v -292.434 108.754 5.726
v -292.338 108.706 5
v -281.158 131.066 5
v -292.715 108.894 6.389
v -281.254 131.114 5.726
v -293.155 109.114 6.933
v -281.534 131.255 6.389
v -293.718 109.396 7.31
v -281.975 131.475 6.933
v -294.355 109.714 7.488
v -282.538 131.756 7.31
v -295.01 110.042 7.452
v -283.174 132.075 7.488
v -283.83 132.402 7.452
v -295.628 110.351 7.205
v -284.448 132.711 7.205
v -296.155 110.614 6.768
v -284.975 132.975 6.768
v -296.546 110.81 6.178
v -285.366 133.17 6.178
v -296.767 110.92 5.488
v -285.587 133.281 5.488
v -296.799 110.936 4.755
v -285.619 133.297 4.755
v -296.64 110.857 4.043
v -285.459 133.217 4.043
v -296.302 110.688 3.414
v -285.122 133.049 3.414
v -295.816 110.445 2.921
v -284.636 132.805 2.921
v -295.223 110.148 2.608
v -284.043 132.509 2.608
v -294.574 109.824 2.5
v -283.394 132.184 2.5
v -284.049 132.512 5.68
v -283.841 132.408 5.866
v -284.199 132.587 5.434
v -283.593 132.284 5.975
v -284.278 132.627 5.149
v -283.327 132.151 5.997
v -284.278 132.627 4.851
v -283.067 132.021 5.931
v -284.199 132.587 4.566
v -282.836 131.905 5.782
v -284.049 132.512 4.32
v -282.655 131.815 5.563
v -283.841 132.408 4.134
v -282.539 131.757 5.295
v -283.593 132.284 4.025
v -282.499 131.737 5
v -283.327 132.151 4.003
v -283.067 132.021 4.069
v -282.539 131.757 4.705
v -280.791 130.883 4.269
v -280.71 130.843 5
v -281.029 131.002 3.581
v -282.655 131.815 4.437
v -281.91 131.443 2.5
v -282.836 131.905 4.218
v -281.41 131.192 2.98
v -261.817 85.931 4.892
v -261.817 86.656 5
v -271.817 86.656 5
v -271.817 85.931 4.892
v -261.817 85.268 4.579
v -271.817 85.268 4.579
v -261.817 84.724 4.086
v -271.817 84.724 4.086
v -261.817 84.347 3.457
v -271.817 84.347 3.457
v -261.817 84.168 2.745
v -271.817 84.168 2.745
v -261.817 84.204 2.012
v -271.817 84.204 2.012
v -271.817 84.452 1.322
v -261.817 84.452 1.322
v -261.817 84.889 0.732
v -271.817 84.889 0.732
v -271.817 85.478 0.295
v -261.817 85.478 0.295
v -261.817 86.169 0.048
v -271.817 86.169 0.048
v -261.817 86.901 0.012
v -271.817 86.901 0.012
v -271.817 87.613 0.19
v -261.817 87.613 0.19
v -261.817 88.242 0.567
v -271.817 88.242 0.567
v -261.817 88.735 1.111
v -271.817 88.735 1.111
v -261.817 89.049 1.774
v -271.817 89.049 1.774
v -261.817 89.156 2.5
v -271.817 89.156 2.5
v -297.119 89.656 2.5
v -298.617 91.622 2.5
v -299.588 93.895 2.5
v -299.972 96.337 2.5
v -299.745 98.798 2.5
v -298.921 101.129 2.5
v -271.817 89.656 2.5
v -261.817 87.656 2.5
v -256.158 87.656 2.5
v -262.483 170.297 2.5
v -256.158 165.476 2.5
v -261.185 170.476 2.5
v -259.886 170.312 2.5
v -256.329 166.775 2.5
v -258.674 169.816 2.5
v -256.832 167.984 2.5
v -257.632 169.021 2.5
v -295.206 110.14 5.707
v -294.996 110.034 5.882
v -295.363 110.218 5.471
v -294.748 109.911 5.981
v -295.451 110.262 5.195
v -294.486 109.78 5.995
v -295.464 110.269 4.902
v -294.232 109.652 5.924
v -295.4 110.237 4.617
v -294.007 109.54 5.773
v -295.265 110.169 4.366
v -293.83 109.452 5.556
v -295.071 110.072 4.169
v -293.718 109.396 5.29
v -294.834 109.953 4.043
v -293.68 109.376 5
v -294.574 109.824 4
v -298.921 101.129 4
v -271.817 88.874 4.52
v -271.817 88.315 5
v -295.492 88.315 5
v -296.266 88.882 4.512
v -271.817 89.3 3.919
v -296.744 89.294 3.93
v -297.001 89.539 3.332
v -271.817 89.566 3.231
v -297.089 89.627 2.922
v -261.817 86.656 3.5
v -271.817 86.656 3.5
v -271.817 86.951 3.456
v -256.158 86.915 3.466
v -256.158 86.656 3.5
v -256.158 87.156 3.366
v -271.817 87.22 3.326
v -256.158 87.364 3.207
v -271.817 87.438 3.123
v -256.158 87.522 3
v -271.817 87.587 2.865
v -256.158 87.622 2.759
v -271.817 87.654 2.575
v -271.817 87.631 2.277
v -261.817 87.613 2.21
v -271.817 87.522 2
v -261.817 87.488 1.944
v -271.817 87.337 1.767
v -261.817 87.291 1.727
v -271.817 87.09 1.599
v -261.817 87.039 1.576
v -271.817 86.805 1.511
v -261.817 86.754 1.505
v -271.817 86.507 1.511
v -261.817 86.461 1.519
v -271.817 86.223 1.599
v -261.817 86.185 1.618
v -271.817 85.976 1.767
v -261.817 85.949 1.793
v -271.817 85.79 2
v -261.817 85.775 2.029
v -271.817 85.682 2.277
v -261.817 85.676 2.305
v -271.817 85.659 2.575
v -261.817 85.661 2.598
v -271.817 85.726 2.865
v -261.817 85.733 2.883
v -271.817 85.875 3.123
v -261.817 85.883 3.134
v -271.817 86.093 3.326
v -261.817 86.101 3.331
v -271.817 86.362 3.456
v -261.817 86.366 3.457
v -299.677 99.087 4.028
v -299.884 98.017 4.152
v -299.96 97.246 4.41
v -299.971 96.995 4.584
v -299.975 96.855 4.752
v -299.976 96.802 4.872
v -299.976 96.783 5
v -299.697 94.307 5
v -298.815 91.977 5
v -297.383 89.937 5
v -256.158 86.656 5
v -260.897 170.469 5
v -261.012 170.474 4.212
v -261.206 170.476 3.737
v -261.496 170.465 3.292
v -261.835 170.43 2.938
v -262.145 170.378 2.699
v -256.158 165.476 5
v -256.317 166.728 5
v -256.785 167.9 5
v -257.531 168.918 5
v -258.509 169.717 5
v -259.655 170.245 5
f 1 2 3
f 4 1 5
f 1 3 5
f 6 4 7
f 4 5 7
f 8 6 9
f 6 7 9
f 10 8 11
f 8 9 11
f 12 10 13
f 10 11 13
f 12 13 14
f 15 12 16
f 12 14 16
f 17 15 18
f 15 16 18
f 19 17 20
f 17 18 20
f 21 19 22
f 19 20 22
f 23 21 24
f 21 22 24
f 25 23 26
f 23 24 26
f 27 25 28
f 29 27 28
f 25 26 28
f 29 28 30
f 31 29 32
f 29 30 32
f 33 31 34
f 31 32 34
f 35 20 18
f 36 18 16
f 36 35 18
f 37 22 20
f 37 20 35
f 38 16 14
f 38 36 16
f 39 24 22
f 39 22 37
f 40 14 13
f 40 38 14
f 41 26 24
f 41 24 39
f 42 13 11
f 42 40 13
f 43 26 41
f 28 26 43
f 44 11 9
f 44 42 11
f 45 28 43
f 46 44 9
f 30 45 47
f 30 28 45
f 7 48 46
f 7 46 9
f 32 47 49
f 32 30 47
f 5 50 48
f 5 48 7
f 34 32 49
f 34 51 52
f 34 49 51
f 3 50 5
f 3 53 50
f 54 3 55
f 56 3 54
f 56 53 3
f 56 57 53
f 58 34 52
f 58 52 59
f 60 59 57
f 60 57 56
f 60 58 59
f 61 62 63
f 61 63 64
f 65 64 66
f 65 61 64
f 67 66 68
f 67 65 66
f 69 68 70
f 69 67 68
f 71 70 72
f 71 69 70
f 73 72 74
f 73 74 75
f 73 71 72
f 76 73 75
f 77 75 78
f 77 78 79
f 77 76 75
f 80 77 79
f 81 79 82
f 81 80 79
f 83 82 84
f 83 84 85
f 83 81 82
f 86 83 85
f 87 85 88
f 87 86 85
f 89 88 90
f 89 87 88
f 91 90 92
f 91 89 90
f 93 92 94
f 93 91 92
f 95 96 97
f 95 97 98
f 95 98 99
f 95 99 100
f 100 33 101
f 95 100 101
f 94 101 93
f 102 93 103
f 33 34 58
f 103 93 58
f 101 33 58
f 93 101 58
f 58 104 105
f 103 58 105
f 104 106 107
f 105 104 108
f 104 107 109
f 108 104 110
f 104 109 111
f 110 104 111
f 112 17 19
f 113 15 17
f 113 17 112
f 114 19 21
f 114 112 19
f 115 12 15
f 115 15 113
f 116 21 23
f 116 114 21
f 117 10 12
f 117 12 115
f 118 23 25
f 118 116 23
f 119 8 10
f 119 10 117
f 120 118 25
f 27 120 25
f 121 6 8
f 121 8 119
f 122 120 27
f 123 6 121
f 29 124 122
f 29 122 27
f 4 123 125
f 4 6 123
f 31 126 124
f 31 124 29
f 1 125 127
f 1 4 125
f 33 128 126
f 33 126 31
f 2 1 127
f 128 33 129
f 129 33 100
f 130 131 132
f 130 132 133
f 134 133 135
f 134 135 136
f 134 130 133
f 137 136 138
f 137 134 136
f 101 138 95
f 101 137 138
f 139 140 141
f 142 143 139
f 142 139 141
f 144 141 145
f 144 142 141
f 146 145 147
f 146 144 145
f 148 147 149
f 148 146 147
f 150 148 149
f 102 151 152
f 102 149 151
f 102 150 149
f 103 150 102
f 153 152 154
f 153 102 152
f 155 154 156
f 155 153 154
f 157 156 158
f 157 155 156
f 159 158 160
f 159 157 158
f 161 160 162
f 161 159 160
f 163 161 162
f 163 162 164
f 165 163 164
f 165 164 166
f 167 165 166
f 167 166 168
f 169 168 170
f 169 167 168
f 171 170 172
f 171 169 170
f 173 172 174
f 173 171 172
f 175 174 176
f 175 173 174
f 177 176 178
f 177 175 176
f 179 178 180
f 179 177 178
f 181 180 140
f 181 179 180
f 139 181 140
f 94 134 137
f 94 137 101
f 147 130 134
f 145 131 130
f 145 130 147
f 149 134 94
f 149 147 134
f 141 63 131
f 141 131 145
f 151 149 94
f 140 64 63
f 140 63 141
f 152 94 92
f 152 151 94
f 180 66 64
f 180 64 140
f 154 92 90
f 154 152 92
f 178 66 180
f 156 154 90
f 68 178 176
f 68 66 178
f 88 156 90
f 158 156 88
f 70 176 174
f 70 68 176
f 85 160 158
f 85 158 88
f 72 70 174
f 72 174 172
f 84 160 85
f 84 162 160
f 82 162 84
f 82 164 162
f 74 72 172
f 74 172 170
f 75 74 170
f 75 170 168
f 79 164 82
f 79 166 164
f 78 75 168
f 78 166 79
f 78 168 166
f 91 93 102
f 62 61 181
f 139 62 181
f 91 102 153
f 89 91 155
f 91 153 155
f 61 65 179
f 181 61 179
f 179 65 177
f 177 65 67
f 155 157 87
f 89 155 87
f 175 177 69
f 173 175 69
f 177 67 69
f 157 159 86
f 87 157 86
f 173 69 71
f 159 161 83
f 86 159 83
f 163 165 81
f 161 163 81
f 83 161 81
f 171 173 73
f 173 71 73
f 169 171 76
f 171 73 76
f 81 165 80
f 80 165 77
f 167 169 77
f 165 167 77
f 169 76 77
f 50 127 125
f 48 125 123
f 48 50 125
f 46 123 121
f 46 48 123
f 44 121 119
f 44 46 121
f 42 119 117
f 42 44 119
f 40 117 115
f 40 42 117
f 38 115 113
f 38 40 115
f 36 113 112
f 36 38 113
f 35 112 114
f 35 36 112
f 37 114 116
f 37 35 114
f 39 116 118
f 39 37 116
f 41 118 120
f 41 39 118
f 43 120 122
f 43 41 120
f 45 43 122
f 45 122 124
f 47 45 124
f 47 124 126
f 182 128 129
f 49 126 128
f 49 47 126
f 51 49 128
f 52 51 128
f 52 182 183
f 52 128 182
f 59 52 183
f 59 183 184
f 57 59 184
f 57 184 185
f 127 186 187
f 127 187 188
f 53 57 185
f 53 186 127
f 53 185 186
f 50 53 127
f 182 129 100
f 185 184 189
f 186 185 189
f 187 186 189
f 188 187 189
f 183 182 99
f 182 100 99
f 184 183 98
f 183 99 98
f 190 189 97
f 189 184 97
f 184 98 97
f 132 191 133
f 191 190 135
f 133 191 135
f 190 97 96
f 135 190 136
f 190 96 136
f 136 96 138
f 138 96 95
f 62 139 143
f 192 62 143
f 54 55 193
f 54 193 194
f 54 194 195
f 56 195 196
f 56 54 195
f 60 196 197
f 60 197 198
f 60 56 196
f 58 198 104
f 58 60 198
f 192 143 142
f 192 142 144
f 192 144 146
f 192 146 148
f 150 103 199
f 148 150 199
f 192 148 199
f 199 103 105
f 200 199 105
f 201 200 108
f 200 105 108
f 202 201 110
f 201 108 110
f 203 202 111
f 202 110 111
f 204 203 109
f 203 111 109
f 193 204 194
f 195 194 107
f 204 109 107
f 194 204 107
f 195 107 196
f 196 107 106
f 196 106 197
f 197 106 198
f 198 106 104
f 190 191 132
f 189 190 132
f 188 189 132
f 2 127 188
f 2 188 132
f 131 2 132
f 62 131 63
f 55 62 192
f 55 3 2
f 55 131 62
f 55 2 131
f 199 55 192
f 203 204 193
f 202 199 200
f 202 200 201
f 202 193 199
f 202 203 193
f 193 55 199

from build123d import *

# Parameters (mm, degrees)
EXTRUDE_1_DEPTH          = 5
SKETCH_5_W               = 5
SKETCH_5_H               = 50
SKETCH_2_W               = 20
SKETCH_2_H               = 5
CUT_EXTRUDE_2_DEPTH      = 698.009362047
CUT_EXTRUDE_2_DEPTH_BACK = 698.009362047
SKETCH_8_R               = 2
SKETCH_12_R              = 6
SKETCH_12_R_2            = 2
CUT_EXTRUDE_6_DEPTH      = 346.897812083
CUT_EXTRUDE_7_DEPTH      = 346.897812083
CUT_EXTRUDE_7_DEPTH_BACK = 346.897812083
SKETCH_13_R              = 2
SKETCH_11_R              = 6
CUT_EXTRUDE_5_DEPTH      = 692.343248918
SCALE_1_SCALE            = 0.5


with BuildPart() as part:
    # 草图1 → 凸台-拉伸1 (new body)
    with BuildSketch(Plane.XY.offset(5)):
        with BuildLine():
            Line((-531.259329651, 335.424320593), (-597.842921786, 202.257136323))
            ThreePointArc((-597.842921786, 202.257136323), (-596.967394134, 182.798242171), (-579.954377966, 173.312864413))
            Line((-579.954377966, 173.312864413), (-512.315057741, 173.312864413))
            Line((-512.315057741, 173.312864413), (-512.315057741, 330.952184638))
            ThreePointArc((-512.315057741, 330.952184638), (-520.017528536, 340.684674533), (-531.259329651, 335.424320593))
        make_face()
    extrude(amount=EXTRUDE_1_DEPTH)

    # 草图5 → 旋转1 (revolve)
    with BuildSketch(Plane(origin=(-559.177191958, 279.588595979, 0), x_dir=(0, 0, 1), z_dir=(-0.894427190999916, 0.4472135954999578, 0))):
        with Locations((7.5, -42.016481195)):
            Rectangle(SKETCH_5_W, SKETCH_5_H)
    revolve(axis=Axis((-566.787193696, 264.368592503, 10), (-0.4472135954999577, -0.894427190999916, 0)))

    # 草图2 → 旋转2 (revolve)
    with BuildSketch(Plane.XZ.offset(-173.312864413)):
        with Locations((-533.634717854, 7.5)):
            Rectangle(SKETCH_2_W, SKETCH_2_H)
    revolve(axis=Axis((-543.634717854, 173.312864413, 5), (1, 0, 0)))

    # 草图8 → 切除-拉伸2 (cut, two sides: drawn at the far end of the back side and taken through both)
    with BuildSketch(Plane(origin=(-29.970681513, -59.941363026, 0), x_dir=(0.894427190999916, -0.4472135954999577, 0), z_dir=(-0.4472135954999577, -0.894427190999916, 0)).offset(-CUT_EXTRUDE_2_DEPTH_BACK)):
        with Locations((-625.179106343, 10)):
            Circle(SKETCH_8_R)
    extrude(amount=CUT_EXTRUDE_2_DEPTH + CUT_EXTRUDE_2_DEPTH_BACK, mode=Mode.SUBTRACT)

    # 草图12 → 切除-拉伸6 (cut, through all)
    with BuildSketch(Plane.ZY.offset(543.634717854)):
        with Locations((5, 173.312864413)):
            Circle(SKETCH_12_R)
        with Locations((5, 173.312864413)):
            Circle(SKETCH_12_R_2, mode=Mode.SUBTRACT)
    extrude(amount=CUT_EXTRUDE_6_DEPTH, mode=Mode.SUBTRACT)

    # 草图13 → 切除-拉伸7 (cut, two sides: drawn at the far end of the back side and taken through both)
    with BuildSketch(Plane.ZY.offset(543.634717854).offset(-CUT_EXTRUDE_7_DEPTH_BACK)):
        with Locations((5, 173.312864413)):
            Circle(SKETCH_13_R)
    extrude(amount=CUT_EXTRUDE_7_DEPTH + CUT_EXTRUDE_7_DEPTH_BACK, mode=Mode.SUBTRACT)

    # 草图11 → 切除-拉伸5 (cut, through all)
    with BuildSketch(Plane(origin=(-7.610001738, -15.220003476, 0), x_dir=(0.8944271909999161, -0.4472135954999577, 0), z_dir=(0.4472135954999577, 0.8944271909999161, 0))):
        with Locations((-625.179106343, -10)):
            Circle(SKETCH_11_R)
    extrude(amount=CUT_EXTRUDE_5_DEPTH, mode=Mode.SUBTRACT)


with BuildPart() as part_1:
    # 缩放比例1: scaled about (0, 0, 0)
    add(part.part.scale(SCALE_1_SCALE))


solid = part_1.part
